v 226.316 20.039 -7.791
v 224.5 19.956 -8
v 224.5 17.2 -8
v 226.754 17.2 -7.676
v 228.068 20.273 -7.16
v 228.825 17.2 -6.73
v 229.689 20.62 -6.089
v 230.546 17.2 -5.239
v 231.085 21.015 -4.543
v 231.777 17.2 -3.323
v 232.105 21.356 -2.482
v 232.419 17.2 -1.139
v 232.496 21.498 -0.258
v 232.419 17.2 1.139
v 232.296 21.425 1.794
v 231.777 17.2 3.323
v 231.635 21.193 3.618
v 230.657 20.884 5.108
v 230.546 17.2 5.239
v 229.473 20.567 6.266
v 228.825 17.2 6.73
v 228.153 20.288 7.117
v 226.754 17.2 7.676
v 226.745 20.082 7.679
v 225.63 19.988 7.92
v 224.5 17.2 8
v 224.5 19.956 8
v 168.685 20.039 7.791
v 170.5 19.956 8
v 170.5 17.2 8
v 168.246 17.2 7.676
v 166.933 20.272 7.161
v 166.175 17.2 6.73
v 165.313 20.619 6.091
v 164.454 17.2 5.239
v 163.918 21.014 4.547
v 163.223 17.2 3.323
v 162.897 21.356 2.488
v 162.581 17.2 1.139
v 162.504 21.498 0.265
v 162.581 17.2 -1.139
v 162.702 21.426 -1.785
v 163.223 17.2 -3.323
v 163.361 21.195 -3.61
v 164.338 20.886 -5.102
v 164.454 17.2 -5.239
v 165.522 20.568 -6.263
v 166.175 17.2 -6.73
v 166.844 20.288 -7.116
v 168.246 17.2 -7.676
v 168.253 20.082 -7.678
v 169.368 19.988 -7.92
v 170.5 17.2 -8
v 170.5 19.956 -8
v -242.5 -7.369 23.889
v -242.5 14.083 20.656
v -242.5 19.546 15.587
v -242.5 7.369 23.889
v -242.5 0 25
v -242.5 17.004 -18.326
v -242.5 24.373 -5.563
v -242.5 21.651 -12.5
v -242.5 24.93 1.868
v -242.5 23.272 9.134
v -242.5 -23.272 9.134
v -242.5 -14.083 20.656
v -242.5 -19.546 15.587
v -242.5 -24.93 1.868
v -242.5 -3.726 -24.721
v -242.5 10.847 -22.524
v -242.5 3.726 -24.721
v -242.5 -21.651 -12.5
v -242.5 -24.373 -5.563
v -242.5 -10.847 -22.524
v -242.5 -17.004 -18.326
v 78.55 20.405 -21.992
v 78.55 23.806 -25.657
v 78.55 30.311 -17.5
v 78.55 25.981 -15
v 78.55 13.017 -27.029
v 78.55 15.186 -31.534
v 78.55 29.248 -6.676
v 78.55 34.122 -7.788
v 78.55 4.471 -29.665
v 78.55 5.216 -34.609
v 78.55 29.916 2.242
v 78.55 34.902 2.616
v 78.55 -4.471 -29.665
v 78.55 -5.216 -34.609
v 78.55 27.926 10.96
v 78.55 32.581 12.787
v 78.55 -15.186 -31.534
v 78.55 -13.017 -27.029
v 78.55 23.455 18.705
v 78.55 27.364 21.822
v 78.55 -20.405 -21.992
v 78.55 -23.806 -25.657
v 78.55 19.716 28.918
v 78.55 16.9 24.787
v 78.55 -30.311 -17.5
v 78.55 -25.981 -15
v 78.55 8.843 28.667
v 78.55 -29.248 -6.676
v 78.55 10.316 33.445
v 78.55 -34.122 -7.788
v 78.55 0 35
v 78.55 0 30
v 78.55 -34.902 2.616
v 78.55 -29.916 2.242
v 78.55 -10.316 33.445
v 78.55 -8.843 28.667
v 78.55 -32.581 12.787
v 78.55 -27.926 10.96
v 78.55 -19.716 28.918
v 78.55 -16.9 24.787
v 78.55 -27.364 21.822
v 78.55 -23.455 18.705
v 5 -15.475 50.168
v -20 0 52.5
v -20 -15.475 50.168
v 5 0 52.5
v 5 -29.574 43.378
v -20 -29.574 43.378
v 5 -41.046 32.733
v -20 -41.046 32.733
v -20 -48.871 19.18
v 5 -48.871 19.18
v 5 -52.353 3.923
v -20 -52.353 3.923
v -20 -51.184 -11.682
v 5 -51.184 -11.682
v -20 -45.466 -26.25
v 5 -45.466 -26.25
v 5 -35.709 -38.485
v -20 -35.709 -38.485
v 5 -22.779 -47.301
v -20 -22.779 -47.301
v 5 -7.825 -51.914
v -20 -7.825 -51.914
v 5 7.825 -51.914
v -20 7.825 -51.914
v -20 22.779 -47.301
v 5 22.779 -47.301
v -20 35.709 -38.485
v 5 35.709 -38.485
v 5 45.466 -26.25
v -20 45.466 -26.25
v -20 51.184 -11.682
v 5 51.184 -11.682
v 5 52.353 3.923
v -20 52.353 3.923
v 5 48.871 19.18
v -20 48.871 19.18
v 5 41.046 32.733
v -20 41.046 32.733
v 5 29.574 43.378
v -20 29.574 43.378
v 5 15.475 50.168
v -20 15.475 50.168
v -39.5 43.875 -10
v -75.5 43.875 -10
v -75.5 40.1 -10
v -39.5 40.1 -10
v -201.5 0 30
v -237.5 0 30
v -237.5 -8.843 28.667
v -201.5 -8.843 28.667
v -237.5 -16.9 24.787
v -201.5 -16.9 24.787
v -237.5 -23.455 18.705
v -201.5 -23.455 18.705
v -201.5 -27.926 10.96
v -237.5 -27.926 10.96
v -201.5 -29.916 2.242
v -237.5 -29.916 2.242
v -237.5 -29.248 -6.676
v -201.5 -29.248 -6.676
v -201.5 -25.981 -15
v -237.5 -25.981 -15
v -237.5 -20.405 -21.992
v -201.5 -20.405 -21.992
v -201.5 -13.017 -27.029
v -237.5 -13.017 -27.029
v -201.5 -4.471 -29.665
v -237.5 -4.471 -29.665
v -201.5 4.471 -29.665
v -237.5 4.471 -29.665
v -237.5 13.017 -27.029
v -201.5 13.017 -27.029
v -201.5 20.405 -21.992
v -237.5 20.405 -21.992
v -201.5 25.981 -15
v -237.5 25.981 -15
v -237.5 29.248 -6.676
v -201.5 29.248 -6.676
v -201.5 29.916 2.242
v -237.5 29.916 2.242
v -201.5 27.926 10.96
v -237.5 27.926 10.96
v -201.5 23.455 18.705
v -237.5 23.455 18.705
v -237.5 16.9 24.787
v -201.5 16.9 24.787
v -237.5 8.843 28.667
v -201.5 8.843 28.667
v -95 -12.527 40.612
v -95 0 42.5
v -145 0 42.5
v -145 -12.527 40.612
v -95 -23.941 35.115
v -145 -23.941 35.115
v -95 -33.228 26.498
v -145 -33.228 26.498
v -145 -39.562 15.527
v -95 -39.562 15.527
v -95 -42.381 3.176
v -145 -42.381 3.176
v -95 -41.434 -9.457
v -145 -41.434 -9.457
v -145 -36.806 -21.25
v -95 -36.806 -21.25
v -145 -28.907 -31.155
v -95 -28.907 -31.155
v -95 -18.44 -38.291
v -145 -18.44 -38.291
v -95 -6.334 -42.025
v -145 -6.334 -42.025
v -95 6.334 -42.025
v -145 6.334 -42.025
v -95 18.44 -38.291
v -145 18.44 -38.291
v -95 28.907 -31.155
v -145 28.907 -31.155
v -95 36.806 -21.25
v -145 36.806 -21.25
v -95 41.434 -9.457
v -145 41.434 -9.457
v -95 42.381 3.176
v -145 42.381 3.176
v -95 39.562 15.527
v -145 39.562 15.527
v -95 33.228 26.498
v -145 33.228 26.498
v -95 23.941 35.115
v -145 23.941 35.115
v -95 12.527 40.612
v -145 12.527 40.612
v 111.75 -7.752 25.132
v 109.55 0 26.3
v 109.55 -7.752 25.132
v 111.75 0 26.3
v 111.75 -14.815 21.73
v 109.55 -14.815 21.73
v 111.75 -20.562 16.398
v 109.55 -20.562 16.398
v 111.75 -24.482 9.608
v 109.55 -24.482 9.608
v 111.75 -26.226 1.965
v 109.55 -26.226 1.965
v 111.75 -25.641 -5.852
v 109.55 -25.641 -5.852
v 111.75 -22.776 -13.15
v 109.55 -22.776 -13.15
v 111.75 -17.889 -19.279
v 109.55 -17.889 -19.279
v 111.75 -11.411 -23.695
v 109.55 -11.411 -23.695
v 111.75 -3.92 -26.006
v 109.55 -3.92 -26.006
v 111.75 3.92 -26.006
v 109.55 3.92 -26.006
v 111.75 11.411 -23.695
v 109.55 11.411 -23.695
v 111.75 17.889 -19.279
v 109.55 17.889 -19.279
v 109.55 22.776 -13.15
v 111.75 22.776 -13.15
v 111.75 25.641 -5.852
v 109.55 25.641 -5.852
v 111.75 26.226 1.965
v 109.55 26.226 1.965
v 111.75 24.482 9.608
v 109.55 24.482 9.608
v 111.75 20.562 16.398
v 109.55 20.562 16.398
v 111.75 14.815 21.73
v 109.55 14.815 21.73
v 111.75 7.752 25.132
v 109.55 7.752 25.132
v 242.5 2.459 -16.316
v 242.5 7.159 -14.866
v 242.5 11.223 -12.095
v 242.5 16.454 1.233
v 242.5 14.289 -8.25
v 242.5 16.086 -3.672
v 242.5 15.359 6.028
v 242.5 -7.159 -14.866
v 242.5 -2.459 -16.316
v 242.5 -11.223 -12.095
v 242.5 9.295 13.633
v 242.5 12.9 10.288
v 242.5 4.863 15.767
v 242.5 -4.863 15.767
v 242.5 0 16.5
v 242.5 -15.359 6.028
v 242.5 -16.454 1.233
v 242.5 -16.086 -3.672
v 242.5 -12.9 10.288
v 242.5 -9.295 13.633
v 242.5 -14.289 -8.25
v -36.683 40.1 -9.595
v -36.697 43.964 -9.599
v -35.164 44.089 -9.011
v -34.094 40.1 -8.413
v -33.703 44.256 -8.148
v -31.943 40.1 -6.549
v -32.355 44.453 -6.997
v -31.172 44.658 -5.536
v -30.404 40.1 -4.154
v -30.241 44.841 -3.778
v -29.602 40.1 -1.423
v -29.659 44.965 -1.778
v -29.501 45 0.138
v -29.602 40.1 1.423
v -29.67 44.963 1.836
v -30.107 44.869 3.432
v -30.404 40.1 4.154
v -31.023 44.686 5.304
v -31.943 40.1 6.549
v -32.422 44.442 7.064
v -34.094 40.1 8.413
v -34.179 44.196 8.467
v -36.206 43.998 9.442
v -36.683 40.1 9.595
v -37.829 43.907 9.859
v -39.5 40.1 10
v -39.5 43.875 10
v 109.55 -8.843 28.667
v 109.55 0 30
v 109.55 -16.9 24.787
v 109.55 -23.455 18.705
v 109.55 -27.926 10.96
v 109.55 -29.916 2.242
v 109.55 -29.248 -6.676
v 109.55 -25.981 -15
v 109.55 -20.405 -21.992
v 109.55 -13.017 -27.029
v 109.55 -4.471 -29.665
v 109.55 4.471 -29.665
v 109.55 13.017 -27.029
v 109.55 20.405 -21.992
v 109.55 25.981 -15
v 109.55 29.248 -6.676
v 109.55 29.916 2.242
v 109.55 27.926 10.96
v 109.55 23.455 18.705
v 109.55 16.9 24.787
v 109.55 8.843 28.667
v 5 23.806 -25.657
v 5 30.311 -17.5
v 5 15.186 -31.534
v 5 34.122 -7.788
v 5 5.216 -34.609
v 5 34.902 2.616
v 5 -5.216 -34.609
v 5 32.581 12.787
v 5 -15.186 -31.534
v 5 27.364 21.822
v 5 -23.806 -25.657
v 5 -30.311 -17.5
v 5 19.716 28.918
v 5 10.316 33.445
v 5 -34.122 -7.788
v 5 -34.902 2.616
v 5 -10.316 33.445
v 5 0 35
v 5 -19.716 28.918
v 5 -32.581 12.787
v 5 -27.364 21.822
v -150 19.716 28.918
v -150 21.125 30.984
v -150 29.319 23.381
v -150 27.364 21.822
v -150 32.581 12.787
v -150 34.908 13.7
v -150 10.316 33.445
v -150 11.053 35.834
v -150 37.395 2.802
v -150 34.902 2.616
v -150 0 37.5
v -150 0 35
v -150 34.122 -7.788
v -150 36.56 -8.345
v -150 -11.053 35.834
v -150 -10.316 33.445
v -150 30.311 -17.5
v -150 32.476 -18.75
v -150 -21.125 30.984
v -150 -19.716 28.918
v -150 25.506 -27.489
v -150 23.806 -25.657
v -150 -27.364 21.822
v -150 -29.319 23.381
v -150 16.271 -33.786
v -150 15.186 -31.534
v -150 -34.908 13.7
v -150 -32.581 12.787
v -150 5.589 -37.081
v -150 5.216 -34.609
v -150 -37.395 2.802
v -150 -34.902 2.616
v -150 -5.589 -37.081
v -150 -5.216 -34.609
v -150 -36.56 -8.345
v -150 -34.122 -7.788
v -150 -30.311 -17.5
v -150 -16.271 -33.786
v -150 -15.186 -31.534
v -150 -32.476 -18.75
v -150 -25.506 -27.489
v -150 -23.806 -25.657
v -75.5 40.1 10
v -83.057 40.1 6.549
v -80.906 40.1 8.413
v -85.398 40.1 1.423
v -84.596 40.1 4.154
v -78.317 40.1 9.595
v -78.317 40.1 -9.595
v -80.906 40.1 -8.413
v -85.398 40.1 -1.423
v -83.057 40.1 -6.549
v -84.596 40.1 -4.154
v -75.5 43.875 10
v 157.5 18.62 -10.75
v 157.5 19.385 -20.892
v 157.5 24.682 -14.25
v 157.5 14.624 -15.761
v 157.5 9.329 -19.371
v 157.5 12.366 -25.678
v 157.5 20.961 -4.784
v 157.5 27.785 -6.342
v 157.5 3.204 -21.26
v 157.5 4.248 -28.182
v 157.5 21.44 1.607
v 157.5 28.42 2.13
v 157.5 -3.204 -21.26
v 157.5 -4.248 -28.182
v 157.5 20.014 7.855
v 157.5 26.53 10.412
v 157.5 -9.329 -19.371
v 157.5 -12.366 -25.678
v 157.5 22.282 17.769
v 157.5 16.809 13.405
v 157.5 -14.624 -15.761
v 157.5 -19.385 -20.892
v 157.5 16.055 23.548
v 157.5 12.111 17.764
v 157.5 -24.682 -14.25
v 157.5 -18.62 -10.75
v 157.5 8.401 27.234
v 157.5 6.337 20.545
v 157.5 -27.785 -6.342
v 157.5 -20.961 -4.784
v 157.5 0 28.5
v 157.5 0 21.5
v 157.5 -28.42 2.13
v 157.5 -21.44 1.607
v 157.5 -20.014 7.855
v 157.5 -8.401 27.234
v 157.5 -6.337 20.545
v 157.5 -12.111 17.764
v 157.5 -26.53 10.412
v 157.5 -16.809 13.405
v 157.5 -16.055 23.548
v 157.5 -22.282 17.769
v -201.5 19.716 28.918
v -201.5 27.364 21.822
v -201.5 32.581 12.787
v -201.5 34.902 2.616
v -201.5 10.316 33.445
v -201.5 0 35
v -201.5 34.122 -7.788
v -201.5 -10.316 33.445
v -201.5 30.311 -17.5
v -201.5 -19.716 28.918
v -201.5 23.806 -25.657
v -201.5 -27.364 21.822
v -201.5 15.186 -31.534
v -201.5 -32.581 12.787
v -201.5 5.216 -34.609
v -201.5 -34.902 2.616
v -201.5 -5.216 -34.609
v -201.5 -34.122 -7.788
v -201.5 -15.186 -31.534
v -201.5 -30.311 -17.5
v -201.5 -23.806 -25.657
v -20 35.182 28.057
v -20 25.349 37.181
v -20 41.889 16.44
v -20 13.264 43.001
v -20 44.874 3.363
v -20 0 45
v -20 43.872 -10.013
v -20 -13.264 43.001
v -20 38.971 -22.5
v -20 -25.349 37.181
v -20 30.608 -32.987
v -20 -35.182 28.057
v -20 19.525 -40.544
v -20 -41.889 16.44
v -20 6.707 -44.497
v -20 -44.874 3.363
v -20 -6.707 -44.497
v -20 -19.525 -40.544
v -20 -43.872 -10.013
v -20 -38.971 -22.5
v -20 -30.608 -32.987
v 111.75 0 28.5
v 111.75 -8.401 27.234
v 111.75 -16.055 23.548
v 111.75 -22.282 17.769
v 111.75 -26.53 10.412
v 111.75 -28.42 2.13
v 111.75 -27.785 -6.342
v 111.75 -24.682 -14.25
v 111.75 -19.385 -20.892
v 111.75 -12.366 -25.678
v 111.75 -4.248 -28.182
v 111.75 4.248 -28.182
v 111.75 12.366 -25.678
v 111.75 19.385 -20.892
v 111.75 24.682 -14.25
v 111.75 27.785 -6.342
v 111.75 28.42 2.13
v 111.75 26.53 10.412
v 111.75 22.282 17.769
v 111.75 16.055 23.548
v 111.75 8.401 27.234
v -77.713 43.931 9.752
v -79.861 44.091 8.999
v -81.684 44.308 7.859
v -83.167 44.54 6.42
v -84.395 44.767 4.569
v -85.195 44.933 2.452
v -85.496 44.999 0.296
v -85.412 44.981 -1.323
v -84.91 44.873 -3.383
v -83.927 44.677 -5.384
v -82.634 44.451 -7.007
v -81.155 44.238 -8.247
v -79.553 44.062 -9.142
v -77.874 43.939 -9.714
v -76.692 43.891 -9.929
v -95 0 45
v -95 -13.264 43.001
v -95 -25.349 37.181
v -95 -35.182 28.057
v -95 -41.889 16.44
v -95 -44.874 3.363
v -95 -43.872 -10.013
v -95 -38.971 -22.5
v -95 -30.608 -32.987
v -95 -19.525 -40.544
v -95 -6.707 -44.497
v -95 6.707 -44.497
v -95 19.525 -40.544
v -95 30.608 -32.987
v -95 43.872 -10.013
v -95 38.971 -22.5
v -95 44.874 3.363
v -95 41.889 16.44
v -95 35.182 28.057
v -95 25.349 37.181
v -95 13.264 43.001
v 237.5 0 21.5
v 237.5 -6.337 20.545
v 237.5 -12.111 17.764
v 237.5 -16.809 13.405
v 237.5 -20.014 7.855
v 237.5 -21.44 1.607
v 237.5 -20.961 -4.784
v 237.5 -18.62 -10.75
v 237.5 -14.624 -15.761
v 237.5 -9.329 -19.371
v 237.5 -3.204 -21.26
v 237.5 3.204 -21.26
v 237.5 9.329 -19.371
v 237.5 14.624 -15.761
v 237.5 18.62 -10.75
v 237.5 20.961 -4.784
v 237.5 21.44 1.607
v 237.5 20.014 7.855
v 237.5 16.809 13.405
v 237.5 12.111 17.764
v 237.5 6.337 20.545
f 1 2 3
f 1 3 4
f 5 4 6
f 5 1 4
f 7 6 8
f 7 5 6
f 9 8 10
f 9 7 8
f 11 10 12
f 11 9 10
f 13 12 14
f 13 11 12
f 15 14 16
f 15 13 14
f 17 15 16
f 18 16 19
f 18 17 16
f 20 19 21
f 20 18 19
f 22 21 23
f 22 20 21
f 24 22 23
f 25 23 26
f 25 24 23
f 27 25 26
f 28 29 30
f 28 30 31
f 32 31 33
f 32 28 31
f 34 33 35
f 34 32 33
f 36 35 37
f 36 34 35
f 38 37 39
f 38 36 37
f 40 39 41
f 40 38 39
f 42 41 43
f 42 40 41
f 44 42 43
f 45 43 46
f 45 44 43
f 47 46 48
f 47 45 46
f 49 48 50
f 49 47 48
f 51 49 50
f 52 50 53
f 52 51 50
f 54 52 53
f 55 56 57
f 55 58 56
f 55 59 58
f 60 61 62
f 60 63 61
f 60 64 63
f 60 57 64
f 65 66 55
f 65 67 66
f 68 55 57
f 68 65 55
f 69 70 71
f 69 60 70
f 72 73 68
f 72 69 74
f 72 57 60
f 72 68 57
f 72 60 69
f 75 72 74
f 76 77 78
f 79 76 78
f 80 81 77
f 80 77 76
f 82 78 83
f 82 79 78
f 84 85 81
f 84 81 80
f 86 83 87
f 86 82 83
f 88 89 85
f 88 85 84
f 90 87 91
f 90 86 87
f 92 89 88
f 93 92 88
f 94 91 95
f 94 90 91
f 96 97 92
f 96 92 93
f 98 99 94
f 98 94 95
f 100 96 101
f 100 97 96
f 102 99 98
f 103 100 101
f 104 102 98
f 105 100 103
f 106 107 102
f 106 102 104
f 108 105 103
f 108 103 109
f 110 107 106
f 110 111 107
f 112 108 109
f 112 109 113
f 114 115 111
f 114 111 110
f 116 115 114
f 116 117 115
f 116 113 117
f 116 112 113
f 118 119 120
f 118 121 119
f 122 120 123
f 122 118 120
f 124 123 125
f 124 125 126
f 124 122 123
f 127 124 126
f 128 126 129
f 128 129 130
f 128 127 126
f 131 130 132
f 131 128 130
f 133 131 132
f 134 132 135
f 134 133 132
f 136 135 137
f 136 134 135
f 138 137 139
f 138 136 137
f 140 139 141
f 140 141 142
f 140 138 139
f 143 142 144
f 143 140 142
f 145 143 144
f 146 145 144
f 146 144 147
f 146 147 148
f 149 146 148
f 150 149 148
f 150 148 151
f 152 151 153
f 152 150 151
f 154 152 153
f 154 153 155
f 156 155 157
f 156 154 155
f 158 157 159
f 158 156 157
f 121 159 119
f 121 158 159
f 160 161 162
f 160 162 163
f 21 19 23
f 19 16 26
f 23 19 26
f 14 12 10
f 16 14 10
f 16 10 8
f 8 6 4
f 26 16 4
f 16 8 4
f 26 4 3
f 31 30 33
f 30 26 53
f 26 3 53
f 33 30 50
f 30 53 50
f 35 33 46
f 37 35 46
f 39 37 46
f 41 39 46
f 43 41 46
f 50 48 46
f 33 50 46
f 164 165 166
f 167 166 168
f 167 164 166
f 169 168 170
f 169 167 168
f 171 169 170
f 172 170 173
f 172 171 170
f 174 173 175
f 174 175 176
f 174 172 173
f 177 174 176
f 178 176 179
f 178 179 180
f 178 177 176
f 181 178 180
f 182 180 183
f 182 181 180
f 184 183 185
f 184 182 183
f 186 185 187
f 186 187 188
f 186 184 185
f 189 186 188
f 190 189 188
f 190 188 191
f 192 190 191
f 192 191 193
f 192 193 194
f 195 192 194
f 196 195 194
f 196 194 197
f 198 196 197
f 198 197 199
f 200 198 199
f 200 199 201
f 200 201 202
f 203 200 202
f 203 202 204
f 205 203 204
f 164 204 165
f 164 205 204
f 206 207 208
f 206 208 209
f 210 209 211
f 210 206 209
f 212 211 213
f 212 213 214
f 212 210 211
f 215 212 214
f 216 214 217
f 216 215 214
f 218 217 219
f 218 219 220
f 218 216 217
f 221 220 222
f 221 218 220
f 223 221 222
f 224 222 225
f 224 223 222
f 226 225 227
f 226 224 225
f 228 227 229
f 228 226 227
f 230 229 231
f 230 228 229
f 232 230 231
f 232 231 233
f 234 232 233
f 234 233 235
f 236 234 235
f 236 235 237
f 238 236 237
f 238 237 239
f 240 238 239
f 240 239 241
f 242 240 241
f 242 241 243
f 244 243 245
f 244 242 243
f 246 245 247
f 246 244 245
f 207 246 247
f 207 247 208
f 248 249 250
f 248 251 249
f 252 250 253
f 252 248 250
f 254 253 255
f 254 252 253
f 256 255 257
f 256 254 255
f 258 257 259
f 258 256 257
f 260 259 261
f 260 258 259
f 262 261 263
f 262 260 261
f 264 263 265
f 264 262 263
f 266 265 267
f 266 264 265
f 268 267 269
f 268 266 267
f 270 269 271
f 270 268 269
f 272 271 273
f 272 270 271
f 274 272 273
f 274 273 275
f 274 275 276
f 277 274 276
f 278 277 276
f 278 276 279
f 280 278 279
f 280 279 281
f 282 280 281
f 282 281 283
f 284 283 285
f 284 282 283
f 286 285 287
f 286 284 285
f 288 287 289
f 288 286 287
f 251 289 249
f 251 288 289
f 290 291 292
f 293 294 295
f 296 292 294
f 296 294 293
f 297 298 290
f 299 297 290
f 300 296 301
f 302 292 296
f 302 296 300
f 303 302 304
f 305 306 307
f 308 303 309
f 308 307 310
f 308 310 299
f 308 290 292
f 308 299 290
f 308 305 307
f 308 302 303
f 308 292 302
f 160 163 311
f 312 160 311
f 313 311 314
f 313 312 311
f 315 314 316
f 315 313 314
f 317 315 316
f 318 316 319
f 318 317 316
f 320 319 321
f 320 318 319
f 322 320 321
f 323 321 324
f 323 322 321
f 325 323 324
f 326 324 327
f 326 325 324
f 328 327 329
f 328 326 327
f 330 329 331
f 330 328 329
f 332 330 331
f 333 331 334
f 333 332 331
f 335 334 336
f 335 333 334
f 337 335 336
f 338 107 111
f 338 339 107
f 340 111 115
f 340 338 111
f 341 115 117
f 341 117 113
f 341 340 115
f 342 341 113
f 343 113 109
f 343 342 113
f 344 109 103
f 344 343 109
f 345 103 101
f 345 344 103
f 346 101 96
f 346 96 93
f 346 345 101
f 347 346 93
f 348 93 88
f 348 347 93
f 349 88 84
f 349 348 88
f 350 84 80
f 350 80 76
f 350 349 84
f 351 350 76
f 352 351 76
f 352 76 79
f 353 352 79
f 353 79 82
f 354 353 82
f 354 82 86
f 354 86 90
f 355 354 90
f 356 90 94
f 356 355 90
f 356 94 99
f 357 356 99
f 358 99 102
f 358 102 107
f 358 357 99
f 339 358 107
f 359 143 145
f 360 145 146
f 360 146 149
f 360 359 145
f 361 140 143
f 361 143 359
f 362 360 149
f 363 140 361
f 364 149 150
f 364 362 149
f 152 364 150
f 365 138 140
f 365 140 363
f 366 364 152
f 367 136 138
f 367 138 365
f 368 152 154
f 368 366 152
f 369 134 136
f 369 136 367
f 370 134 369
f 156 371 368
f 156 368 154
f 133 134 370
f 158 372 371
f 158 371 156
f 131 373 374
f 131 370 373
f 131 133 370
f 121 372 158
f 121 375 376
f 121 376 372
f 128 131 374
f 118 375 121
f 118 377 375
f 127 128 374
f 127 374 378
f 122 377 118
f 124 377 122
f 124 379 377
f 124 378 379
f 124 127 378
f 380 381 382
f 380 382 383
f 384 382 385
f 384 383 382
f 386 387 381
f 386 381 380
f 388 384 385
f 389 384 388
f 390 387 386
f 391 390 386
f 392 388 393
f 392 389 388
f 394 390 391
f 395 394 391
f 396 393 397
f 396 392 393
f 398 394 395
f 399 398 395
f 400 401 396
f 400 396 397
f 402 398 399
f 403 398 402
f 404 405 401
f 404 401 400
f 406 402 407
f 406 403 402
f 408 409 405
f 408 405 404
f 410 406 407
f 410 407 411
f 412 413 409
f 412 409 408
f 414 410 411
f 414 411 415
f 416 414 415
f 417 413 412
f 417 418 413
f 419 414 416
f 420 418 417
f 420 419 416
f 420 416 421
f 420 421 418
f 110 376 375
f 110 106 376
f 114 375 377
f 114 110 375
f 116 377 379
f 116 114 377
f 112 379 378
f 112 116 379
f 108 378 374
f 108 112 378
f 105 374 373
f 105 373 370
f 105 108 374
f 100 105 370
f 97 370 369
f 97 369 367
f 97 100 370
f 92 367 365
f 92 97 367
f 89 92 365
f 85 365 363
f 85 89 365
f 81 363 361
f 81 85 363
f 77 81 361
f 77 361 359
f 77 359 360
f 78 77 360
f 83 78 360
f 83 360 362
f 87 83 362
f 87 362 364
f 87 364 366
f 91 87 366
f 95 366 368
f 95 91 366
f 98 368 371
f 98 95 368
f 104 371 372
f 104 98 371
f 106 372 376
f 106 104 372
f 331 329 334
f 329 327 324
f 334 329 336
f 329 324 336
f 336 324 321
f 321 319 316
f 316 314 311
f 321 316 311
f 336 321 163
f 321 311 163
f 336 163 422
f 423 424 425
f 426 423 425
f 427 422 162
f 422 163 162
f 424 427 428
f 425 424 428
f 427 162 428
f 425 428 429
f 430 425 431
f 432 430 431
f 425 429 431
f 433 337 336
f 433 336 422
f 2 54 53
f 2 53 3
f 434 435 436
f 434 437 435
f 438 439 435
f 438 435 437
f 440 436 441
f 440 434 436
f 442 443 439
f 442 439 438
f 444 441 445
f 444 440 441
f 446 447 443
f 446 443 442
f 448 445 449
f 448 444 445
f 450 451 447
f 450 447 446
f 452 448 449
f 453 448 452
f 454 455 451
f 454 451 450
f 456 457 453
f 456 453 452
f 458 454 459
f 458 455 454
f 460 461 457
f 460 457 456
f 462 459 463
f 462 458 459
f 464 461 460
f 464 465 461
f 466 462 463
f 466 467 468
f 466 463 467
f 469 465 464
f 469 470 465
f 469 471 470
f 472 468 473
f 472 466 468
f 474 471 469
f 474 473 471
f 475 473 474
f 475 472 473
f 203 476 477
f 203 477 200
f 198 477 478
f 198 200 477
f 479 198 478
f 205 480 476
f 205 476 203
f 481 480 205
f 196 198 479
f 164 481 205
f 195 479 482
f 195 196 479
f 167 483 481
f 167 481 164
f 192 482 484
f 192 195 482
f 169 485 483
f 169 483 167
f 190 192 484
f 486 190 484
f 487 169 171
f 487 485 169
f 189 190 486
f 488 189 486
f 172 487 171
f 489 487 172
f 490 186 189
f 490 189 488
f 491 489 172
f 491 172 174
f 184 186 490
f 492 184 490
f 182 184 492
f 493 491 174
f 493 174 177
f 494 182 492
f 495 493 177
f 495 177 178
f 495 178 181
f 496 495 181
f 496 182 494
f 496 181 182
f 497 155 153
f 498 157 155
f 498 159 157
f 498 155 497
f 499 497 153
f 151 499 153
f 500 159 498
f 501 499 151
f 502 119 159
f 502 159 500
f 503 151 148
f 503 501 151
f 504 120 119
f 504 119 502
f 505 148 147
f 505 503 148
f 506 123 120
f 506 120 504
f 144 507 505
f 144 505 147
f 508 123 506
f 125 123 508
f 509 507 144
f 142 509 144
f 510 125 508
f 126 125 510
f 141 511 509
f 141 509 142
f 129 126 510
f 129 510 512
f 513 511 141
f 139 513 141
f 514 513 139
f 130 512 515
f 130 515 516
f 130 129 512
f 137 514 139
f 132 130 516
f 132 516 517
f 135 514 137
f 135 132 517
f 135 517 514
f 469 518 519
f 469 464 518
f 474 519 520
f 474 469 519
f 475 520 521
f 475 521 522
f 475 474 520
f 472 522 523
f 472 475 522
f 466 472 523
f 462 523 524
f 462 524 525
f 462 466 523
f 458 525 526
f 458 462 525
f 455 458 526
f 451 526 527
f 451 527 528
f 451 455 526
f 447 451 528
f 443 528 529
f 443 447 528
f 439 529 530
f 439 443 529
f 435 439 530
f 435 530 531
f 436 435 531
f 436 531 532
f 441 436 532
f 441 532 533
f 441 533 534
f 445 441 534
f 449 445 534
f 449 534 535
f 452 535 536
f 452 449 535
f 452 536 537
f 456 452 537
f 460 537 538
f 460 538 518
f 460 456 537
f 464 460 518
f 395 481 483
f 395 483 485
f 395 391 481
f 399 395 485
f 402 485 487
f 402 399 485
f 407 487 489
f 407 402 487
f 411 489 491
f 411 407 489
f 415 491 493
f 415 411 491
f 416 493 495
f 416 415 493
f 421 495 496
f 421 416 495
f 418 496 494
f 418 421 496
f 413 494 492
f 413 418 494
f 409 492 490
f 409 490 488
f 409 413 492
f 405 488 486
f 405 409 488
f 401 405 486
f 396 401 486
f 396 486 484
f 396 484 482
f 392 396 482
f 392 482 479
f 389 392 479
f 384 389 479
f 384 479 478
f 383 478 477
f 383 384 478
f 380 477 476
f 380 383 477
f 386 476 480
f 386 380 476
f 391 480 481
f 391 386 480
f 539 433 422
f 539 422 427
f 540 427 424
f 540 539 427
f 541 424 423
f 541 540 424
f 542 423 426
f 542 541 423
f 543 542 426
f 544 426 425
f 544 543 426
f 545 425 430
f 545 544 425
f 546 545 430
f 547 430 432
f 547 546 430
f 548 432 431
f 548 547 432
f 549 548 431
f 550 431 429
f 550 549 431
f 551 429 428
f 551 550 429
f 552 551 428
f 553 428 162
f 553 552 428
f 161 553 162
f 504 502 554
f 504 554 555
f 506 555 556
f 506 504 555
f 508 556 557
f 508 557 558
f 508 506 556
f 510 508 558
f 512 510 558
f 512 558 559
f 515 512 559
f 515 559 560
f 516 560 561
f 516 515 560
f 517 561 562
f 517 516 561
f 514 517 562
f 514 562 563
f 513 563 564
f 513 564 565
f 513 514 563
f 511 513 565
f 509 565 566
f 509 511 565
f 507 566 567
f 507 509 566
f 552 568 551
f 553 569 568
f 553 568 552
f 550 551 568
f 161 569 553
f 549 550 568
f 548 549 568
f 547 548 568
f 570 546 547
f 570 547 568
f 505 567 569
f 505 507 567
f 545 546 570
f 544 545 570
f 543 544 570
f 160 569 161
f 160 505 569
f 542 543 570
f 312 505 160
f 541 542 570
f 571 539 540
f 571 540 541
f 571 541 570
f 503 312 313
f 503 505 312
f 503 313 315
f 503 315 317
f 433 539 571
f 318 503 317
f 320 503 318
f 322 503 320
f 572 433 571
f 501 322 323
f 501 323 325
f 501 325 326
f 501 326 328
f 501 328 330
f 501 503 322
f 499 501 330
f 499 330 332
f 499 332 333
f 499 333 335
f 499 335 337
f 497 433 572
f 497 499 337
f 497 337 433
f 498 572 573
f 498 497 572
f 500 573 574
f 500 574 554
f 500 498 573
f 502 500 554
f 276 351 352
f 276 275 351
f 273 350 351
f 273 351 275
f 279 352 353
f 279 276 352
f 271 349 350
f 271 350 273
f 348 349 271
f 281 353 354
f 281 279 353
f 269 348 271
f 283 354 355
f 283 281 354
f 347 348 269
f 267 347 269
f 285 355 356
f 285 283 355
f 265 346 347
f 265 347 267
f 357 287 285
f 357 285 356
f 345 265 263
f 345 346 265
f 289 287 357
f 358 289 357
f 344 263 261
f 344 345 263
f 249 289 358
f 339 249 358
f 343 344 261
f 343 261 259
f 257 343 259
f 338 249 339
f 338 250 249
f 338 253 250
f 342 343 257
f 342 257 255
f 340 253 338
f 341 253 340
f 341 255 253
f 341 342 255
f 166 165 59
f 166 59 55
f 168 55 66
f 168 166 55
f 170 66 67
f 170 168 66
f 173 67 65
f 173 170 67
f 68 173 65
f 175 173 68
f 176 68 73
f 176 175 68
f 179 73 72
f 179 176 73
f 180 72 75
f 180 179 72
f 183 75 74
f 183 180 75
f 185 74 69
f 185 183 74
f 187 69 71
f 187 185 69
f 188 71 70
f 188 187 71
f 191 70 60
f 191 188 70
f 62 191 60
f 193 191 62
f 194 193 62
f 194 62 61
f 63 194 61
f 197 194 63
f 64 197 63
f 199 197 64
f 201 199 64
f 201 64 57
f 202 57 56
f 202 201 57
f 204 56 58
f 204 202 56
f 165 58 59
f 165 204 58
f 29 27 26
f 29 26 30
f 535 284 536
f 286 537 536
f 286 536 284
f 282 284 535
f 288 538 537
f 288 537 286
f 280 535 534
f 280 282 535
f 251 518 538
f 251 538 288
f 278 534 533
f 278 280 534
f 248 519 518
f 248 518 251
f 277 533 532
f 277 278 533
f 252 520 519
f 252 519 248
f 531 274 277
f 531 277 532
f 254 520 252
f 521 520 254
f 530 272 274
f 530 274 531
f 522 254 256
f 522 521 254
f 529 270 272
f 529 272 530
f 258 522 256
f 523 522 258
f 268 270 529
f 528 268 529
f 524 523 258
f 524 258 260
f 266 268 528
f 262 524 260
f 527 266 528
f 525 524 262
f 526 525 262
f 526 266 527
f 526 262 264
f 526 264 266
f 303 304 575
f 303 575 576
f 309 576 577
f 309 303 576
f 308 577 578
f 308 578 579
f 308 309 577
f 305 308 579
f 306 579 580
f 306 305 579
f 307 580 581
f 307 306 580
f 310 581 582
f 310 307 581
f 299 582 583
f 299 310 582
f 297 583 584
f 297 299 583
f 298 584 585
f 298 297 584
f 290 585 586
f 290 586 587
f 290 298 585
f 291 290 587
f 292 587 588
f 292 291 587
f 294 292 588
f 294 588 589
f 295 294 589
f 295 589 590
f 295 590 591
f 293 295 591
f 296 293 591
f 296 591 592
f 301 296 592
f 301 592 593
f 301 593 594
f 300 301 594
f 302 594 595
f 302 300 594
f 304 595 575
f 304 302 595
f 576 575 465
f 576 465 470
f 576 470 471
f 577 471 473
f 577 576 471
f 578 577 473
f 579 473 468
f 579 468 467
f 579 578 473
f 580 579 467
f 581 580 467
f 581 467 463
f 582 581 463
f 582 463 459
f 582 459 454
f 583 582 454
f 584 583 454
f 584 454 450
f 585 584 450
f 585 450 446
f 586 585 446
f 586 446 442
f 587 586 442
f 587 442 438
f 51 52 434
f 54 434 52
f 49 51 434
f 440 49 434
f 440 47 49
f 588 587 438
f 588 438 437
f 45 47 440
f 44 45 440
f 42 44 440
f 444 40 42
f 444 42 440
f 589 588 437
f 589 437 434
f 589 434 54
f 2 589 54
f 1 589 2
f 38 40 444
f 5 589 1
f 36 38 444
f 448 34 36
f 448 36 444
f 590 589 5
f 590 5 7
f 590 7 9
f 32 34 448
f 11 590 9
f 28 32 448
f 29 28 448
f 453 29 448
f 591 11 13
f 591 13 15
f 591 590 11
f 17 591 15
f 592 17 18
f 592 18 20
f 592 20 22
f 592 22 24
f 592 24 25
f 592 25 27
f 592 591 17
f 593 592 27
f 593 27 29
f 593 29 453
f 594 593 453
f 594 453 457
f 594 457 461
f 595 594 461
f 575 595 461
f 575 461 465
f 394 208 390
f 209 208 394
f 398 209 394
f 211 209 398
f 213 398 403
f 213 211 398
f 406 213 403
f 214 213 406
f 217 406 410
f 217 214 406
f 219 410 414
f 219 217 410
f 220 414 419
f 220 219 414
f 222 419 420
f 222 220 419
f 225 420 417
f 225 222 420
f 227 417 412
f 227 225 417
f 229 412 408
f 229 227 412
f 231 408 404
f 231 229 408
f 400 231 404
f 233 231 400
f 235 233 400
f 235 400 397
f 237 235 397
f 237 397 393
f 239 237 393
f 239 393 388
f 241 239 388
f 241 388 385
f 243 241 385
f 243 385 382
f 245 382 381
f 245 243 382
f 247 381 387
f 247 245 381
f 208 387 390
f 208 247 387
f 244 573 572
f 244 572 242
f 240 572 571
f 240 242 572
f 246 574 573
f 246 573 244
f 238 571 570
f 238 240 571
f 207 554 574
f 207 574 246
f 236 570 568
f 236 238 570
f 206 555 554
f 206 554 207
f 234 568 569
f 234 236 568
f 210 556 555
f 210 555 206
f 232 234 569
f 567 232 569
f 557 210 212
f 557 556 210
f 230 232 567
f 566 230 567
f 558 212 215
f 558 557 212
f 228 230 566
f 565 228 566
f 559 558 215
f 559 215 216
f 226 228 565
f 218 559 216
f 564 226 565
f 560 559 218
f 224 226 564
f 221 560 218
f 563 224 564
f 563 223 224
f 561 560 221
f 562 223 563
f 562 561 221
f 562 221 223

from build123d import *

# Parameters (mm, degrees)
CHAMFER1_SIZE      = 5
CUT_EXTRUDE1_START = 45
CUT_EXTRUDE1_DEPTH = 4.9
CUT_EXTRUDE2_START = 21.5
CUT_EXTRUDE2_DEPTH = 4.3


with BuildPart() as part:
    # Sketch2 → Revolve1 (revolve)
    with BuildSketch(Plane(origin=(0, 0, 0), x_dir=(1, 0, 0), z_dir=(0, 1, 0)), mode=Mode.PRIVATE) as revolve1_sk:
        Polygon((242.5, 0), (-242.5, 0), (-242.5, 30), (-201.5, 30), (-201.5, 35), (-150, 35), (-150, 42.5), (-95, 42.5), (-95, 45), (-20, 45), (-20, 52.5), (5, 52.5), (5, 35), (78.55, 35), (78.55, 30), (109.55, 30), (109.55, 26.3), (111.75, 26.3), (111.75, 28.5), (157.5, 28.5), (157.5, 21.5), (242.5, 21.5), align=None)
    revolve(revolve1_sk.sketch.rotate(Axis((-418.822463349, 0, 0), (1, 0, 0)), 180), axis=Axis((-418.822463349, 0, 0), (1, 0, 0)))

    # Chamfer1
    chamfer1_edges = [part.edges().sort_by_distance(p)[0] for p in [
        (242.5, 0, -21.5),
        (-150, 0, -42.5),
        (-242.5, 0, -30),
    ]]
    chamfer(chamfer1_edges, length=CHAMFER1_SIZE)

    # Sketch3 → Cut-Extrude1 (cut, symmetric)
    with BuildSketch(Plane(origin=(0, 0, 0), x_dir=(1, 0, 0), z_dir=(0, 1, 0)).offset(CUT_EXTRUDE1_START)):
        with BuildLine():
            Line((-75.5, 10), (-39.5, 10))
            ThreePointArc((-39.5, 10), (-29.5, 0), (-39.5, -10))
            Line((-39.5, -10), (-75.5, -10))
            ThreePointArc((-75.5, -10), (-85.5, 0), (-75.5, 10))
        make_face()
    extrude(amount=CUT_EXTRUDE1_DEPTH, both=True, mode=Mode.SUBTRACT)

    # Sketch4 → Cut-Extrude2 (cut, symmetric)
    with BuildSketch(Plane(origin=(0, 0, 0), x_dir=(1, 0, 0), z_dir=(0, 1, 0)).offset(CUT_EXTRUDE2_START)):
        with BuildLine():
            Line((170.5, 8), (224.5, 8))
            ThreePointArc((224.5, 8), (232.5, 0), (224.5, -8))
            Line((224.5, -8), (170.5, -8))
            ThreePointArc((170.5, -8), (162.5, 0), (170.5, 8))
        make_face()
    extrude(amount=CUT_EXTRUDE2_DEPTH, both=True, mode=Mode.SUBTRACT)


solid = part.part
